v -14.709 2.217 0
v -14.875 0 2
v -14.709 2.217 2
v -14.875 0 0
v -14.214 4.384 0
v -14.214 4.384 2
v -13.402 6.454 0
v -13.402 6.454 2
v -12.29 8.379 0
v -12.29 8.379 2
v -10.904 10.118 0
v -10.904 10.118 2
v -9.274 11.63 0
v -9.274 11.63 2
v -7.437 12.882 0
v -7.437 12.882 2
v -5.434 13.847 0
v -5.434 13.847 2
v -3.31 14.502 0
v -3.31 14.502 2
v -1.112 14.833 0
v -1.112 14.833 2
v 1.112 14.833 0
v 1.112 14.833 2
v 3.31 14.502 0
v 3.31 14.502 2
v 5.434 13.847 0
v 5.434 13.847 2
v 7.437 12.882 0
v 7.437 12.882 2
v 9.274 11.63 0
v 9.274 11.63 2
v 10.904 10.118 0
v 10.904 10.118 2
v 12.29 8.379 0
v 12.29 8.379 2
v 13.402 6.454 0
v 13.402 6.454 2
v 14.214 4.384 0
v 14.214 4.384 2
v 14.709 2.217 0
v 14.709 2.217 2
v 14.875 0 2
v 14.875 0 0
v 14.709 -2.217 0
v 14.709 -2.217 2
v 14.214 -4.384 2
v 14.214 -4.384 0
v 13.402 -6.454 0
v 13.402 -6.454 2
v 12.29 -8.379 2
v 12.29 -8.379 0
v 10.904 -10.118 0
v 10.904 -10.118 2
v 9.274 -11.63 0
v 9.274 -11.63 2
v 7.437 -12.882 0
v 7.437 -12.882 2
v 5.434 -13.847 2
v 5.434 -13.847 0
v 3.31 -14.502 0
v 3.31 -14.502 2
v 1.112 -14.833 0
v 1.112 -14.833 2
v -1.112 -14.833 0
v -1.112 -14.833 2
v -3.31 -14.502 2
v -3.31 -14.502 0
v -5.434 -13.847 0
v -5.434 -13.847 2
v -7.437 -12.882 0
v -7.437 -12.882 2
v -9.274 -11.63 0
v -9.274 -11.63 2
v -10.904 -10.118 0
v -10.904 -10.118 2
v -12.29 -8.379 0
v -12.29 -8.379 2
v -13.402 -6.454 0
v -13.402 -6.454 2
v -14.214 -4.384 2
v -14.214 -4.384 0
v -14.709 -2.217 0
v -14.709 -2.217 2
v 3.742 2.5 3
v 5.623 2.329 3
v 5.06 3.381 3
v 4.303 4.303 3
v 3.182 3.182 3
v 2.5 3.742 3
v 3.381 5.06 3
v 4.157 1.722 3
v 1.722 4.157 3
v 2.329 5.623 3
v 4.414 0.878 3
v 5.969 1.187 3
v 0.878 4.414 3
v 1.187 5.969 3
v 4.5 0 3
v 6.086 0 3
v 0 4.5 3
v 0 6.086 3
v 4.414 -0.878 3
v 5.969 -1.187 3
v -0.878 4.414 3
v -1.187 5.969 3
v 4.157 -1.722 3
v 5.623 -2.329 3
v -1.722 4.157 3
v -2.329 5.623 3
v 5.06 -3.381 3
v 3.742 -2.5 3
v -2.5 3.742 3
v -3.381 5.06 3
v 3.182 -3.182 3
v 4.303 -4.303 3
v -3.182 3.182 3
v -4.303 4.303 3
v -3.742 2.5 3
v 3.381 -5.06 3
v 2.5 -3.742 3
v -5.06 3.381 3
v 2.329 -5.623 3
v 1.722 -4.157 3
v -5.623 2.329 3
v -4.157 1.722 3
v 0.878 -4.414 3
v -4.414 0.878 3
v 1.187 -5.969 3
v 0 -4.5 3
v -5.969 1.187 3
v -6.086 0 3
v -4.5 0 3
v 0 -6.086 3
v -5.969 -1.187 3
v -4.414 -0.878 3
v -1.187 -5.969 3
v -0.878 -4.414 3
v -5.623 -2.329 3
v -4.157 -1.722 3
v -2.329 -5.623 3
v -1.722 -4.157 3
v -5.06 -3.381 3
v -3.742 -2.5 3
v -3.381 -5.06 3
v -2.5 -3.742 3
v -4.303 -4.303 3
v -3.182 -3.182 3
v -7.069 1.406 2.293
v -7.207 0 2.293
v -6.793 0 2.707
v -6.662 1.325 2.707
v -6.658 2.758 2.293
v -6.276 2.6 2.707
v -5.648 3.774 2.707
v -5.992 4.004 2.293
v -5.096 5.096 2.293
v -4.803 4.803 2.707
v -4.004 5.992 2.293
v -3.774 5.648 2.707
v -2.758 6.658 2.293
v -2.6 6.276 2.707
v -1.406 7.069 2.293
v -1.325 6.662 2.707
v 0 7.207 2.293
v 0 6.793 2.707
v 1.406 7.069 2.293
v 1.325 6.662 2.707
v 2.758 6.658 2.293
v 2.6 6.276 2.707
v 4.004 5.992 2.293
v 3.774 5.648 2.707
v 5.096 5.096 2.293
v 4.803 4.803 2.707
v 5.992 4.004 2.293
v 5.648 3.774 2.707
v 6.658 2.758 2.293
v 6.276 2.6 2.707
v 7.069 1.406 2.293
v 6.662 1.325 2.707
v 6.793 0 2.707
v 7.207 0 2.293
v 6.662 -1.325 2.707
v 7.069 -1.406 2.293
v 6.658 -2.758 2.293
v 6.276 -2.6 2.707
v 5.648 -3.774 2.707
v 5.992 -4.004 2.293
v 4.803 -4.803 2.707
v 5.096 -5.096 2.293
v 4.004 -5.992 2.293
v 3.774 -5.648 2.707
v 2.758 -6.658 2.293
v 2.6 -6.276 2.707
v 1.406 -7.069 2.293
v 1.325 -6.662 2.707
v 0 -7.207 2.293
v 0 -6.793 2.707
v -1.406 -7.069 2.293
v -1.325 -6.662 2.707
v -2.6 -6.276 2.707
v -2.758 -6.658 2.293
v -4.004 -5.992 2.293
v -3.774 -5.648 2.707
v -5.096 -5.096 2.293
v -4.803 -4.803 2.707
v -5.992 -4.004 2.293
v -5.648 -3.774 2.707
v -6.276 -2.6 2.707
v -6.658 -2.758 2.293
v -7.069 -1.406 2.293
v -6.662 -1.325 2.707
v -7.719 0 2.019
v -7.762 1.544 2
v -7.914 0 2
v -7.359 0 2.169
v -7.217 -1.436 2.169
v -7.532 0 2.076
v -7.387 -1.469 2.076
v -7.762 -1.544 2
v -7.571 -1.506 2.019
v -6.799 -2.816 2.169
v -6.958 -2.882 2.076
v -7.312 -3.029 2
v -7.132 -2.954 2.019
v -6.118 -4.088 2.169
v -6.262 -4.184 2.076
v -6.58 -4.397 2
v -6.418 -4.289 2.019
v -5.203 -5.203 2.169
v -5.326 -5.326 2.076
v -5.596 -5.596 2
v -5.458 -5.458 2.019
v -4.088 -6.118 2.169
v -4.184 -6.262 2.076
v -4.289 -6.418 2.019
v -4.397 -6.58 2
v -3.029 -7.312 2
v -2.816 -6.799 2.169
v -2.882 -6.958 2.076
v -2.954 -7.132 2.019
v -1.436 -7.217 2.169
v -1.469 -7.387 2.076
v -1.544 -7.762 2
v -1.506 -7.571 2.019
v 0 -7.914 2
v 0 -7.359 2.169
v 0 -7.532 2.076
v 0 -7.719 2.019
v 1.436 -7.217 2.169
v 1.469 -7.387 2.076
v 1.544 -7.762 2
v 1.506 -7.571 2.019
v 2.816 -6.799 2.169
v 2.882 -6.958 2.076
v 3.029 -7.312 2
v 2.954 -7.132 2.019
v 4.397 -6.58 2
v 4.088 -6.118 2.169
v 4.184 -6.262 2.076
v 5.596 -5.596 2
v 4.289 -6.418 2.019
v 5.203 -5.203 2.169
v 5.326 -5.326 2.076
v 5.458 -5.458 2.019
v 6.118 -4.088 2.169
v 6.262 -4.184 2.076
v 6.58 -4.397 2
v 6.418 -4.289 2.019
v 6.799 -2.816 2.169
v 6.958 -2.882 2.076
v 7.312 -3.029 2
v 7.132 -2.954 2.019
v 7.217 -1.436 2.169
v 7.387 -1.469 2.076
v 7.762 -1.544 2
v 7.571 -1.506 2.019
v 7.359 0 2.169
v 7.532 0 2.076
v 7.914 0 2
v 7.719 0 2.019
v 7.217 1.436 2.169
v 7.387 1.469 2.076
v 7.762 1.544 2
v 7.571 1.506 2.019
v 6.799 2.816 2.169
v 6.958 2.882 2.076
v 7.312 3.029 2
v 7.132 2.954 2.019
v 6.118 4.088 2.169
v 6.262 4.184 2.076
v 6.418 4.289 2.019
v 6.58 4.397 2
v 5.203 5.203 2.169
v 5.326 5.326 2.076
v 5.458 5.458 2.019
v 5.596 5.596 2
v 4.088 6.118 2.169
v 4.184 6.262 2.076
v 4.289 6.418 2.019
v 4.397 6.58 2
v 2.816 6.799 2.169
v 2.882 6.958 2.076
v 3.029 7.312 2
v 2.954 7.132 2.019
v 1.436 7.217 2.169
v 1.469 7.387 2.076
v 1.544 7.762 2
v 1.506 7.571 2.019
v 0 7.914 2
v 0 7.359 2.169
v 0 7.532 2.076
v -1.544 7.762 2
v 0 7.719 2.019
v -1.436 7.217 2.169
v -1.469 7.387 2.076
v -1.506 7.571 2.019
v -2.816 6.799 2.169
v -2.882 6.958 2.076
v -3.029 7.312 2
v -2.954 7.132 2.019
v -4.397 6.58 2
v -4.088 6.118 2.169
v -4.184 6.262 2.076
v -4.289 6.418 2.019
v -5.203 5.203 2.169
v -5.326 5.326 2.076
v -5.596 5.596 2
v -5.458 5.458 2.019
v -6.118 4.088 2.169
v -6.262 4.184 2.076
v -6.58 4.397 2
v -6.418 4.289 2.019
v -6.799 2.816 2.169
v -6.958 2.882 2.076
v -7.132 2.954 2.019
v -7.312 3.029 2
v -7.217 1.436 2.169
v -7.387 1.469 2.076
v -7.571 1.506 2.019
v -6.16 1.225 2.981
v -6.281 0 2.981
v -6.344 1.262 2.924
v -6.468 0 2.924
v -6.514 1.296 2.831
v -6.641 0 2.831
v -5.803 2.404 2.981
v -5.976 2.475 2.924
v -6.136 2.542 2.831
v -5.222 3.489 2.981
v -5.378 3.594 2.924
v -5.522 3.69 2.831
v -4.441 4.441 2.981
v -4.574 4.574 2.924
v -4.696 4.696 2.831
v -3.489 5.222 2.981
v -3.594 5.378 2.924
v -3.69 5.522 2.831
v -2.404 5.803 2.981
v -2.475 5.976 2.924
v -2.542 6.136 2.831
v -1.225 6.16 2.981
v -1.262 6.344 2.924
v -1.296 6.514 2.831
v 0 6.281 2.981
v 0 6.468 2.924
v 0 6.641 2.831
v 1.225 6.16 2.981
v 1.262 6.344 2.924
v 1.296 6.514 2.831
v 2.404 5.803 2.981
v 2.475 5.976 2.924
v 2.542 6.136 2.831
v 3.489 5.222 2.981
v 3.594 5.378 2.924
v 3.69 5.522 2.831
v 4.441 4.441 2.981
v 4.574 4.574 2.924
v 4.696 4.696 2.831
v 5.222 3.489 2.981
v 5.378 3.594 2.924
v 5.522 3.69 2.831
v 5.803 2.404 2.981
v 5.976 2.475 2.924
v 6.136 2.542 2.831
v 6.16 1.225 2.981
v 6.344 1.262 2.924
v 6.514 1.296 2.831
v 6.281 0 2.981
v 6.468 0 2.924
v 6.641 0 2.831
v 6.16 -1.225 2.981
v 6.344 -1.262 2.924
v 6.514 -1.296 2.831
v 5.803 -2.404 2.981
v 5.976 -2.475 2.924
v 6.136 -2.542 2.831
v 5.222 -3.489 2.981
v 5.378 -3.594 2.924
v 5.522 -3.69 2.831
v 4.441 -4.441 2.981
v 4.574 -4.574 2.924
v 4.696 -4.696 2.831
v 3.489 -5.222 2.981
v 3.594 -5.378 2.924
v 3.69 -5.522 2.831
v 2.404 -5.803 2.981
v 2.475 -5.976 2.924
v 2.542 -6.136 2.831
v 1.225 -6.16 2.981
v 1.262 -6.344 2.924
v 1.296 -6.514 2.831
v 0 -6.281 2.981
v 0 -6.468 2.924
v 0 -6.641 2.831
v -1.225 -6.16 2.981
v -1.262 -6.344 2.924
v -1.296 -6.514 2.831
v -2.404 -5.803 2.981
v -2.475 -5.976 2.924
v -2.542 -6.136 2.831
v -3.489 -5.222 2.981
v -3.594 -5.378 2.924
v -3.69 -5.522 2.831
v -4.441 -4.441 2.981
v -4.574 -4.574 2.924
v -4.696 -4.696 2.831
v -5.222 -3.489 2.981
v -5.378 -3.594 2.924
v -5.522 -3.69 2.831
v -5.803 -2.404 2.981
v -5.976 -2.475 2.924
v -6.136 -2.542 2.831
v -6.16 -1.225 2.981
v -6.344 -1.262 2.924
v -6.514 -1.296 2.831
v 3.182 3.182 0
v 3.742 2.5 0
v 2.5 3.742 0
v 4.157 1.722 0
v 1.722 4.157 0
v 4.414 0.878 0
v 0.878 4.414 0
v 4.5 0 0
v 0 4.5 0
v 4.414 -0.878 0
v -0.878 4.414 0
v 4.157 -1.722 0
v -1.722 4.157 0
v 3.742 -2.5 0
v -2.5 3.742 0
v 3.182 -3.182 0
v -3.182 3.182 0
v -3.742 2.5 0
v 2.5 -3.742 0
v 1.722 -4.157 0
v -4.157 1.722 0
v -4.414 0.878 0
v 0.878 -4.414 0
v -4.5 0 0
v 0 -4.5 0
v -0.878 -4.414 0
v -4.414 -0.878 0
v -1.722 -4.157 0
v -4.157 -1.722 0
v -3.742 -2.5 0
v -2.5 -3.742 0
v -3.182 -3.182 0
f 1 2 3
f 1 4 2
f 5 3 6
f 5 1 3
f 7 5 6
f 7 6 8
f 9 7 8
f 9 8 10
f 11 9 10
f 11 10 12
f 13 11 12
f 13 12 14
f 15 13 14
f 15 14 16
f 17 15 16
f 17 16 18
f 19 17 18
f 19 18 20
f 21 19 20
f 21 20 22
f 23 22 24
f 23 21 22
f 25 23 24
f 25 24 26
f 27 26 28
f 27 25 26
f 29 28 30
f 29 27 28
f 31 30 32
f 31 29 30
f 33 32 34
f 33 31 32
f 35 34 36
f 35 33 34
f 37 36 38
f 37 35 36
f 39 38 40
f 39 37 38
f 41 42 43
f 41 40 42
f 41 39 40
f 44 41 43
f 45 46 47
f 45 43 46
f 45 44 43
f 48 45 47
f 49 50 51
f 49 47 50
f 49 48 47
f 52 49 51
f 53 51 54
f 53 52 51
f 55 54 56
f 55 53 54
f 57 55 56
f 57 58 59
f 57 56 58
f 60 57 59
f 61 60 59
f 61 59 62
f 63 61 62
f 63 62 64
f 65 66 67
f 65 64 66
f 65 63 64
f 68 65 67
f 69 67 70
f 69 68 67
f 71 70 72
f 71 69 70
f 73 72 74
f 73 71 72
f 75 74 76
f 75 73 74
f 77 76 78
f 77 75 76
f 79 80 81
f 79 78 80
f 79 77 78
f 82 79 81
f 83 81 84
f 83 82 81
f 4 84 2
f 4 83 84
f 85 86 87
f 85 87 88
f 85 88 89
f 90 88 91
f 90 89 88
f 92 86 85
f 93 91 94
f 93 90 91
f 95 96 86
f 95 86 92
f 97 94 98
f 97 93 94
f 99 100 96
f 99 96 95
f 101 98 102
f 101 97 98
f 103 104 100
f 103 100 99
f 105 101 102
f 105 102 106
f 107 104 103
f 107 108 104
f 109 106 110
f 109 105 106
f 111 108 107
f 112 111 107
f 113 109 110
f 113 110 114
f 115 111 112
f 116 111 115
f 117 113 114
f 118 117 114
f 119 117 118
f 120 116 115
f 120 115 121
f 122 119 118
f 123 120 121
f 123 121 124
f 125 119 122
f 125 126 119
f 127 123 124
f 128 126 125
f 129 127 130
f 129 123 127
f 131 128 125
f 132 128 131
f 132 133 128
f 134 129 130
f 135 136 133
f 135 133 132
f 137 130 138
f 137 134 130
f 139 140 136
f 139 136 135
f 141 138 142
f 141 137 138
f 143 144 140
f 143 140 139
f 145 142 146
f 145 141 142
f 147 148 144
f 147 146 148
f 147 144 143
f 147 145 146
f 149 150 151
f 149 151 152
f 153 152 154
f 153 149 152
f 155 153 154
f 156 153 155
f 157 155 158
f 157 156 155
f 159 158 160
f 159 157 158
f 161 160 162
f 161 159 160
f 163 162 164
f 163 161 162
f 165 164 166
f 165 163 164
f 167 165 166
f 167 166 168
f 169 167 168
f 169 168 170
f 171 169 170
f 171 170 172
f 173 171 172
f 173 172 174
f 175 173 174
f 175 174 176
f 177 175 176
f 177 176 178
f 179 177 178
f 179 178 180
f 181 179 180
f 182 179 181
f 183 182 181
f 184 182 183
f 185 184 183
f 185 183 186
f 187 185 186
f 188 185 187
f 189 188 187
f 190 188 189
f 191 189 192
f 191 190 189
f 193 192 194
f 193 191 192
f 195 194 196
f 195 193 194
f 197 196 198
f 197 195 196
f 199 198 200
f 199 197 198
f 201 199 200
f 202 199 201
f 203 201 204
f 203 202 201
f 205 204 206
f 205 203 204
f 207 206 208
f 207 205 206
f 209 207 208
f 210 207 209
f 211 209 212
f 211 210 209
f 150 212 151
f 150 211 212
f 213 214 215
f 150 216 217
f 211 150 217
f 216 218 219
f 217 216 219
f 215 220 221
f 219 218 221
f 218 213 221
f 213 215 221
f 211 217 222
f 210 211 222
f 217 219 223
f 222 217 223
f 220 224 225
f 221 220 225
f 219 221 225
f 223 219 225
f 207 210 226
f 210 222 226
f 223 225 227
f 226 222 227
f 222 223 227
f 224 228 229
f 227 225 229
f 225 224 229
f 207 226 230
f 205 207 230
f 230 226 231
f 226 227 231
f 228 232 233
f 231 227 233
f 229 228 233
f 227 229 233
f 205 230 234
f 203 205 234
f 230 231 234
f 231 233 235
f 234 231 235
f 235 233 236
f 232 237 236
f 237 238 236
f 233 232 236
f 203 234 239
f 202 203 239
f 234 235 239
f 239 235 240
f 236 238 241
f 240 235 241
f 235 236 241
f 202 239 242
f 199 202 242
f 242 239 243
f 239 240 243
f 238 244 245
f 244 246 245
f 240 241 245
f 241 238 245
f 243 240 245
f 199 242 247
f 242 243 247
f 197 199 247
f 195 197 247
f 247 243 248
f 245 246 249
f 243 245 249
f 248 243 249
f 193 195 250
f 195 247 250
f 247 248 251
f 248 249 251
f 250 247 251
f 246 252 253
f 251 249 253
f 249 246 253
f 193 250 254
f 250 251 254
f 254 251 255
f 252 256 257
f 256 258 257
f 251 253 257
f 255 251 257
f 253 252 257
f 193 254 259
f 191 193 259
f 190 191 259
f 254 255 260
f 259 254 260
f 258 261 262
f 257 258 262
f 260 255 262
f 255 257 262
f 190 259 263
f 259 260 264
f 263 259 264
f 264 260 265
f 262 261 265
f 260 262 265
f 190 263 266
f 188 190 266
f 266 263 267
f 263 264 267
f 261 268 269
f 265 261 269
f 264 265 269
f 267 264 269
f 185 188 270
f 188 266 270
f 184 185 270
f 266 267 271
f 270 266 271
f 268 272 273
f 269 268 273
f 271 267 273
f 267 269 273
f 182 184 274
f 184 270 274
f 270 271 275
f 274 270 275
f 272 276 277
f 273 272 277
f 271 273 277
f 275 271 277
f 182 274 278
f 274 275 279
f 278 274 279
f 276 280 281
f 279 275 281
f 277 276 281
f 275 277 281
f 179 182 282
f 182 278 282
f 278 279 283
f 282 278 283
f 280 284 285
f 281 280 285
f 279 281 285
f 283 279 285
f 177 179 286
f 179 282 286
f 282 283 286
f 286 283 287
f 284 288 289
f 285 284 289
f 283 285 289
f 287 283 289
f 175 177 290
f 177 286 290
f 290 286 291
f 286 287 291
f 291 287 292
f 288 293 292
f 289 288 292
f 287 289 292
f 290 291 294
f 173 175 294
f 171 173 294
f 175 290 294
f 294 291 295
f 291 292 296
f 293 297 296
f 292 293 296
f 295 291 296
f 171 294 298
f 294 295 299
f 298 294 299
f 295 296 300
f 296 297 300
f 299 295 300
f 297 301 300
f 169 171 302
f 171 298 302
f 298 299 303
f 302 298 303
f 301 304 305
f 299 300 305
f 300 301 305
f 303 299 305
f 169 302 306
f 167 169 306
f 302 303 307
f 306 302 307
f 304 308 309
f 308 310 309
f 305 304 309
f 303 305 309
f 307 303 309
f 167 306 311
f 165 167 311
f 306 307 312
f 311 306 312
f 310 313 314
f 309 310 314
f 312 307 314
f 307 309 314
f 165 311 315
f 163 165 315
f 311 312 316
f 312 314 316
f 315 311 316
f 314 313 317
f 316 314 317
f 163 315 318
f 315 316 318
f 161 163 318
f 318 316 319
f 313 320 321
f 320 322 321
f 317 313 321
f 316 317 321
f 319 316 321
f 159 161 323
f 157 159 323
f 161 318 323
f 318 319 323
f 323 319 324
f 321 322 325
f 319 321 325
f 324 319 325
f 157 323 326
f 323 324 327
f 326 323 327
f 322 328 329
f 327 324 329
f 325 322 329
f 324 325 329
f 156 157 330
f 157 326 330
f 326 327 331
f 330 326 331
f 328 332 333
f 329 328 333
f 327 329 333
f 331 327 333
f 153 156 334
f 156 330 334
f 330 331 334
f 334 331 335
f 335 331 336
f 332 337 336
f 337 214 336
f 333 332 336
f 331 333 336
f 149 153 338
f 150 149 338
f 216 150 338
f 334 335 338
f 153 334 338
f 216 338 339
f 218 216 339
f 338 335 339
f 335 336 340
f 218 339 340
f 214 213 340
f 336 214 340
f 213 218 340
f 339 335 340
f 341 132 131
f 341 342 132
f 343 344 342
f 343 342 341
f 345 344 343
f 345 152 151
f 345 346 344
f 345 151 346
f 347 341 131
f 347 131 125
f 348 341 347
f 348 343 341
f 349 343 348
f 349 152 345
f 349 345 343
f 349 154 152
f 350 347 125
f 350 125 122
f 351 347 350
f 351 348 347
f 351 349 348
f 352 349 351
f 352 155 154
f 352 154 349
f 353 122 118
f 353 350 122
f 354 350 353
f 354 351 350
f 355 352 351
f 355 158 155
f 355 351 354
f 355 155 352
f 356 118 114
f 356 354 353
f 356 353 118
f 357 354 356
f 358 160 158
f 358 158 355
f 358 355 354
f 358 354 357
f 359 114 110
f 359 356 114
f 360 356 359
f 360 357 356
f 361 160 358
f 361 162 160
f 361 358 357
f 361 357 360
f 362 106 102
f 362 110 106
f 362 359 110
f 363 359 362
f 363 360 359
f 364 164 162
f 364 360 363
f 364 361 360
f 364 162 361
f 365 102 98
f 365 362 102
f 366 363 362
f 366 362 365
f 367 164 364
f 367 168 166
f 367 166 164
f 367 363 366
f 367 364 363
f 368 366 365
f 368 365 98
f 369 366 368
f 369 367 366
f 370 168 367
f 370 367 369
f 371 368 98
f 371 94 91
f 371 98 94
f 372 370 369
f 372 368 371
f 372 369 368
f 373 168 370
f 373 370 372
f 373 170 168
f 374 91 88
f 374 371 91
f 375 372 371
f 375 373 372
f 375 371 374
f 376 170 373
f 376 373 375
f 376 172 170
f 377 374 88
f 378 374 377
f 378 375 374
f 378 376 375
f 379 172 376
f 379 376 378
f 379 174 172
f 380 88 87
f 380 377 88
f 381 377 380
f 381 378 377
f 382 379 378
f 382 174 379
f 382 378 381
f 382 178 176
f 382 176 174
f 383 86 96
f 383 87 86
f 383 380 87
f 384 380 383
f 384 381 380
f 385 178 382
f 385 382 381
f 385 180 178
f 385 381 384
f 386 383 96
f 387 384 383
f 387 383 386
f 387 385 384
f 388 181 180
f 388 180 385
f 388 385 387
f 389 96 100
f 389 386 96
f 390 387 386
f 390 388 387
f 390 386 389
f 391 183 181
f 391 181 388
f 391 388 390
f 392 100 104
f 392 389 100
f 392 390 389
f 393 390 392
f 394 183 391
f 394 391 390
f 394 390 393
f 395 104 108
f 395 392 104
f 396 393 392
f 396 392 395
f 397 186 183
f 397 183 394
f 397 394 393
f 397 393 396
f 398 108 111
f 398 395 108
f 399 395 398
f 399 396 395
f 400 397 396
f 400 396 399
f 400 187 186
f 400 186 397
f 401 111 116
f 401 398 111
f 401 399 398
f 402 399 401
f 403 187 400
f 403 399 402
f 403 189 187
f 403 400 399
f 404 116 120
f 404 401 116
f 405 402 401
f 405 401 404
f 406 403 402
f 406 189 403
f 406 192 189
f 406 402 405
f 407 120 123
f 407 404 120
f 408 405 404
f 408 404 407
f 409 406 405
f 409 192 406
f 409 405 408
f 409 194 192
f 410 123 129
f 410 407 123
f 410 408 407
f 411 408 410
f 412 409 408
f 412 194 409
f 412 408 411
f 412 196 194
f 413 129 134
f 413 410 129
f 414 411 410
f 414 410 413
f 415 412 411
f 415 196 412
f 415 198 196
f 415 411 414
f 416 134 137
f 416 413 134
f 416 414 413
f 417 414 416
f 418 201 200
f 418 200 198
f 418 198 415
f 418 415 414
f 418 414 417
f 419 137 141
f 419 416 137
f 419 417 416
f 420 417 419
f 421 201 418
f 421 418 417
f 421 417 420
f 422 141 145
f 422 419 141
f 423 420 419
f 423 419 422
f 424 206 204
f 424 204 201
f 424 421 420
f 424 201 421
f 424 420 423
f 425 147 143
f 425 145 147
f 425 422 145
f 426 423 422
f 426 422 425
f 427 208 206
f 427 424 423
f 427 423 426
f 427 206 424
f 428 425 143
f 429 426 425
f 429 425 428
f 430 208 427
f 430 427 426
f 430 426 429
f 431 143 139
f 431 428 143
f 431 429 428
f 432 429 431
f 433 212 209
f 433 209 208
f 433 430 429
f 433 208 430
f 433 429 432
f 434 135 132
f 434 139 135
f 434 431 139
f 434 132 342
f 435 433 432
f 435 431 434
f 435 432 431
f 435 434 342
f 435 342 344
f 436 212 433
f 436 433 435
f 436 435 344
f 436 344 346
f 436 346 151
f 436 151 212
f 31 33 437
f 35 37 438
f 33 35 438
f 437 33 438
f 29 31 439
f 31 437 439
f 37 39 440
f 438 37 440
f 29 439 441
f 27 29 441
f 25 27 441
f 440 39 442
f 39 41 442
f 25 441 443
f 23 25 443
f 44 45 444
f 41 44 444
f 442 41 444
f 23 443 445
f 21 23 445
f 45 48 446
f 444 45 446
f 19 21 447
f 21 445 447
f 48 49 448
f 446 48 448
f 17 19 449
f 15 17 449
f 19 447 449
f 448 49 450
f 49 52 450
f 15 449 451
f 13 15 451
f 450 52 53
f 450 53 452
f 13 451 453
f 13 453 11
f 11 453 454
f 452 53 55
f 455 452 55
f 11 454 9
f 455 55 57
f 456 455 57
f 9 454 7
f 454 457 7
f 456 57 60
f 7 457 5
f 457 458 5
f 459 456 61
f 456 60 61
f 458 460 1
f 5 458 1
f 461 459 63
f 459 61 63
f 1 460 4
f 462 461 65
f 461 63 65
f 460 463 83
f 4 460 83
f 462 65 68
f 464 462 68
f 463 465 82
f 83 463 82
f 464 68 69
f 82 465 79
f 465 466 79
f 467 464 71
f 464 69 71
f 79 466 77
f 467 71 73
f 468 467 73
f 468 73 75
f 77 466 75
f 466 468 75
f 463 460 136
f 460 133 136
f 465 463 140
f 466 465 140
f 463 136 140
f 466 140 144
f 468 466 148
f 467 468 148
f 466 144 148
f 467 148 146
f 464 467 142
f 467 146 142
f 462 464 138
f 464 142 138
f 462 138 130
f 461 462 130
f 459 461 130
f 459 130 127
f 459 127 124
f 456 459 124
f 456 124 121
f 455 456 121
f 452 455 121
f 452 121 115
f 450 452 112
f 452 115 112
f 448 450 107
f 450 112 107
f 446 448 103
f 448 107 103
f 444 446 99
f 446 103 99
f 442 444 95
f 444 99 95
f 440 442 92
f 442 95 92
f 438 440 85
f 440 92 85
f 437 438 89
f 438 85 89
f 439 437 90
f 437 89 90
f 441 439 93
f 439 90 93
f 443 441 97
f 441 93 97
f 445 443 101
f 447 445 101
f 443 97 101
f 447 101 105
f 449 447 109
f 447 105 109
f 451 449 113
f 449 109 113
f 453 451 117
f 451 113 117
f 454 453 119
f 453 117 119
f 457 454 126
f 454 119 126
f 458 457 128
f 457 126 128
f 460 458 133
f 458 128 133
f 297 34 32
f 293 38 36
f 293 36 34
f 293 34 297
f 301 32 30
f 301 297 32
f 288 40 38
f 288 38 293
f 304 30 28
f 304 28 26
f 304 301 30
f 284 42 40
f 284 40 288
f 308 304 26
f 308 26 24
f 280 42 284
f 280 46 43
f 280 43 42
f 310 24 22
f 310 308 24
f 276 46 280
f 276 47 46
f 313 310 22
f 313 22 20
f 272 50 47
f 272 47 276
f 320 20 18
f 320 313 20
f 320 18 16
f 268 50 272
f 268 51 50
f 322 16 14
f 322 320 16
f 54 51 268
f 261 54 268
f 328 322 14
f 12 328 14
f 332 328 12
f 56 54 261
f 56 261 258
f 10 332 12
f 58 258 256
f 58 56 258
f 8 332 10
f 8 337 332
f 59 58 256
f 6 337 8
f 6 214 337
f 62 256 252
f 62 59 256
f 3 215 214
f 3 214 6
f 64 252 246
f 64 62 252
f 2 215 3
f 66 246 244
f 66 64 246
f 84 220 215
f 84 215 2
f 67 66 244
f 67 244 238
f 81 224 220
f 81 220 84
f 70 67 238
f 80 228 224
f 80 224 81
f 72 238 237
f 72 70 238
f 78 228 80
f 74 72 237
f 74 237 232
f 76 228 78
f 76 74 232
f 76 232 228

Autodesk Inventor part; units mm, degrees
ref_plane "YZ Plane" through (0, 0, 0) normal (1, 0, 0) x (0, 1, 0)
ref_plane "XZ Plane" through (0, 0, 0) normal (0, 1, 0) x (-1, 0, 0)
ref_plane "XY Plane" through (0, 0, 0) normal (0, 0, 1) x (1, 0, 0)
sketch "Sketch1" plane through (0, 0, 0) normal (0, 1, 0) x (-1, 0, 0)
  line L0 (4.5, 0) -> (4.5, 3)
  line L1 (4.5, 3) -> (6.5, 3)
  line L2 (6.5, 3) -> (7.5, 2)
  line L3 (7.5, 2) -> (14.875, 2)
  line L4 (14.875, 2) -> (14.875, 0)
  line L5 (14.875, 0) -> (4.5, 0)
  line L6 (0, 0) -> (0, 4.9053) construction
  dimension "d0" = 14.875
  dimension "d1" = 4.5
  dimension "d2" = 6.5
  dimension "d3" = 2
  dimension "d4" = 3
  dimension "d5" = 1
revolve "Revolution1" add sketch "Sketch1" angle 360 about axis through (0, 0, 0) along (0, 0, 1)
fillet "Fillet1" radius 1 2 edges at (7.5, 0, 2) (6.5, 0, 3)
properties part number "washer"
